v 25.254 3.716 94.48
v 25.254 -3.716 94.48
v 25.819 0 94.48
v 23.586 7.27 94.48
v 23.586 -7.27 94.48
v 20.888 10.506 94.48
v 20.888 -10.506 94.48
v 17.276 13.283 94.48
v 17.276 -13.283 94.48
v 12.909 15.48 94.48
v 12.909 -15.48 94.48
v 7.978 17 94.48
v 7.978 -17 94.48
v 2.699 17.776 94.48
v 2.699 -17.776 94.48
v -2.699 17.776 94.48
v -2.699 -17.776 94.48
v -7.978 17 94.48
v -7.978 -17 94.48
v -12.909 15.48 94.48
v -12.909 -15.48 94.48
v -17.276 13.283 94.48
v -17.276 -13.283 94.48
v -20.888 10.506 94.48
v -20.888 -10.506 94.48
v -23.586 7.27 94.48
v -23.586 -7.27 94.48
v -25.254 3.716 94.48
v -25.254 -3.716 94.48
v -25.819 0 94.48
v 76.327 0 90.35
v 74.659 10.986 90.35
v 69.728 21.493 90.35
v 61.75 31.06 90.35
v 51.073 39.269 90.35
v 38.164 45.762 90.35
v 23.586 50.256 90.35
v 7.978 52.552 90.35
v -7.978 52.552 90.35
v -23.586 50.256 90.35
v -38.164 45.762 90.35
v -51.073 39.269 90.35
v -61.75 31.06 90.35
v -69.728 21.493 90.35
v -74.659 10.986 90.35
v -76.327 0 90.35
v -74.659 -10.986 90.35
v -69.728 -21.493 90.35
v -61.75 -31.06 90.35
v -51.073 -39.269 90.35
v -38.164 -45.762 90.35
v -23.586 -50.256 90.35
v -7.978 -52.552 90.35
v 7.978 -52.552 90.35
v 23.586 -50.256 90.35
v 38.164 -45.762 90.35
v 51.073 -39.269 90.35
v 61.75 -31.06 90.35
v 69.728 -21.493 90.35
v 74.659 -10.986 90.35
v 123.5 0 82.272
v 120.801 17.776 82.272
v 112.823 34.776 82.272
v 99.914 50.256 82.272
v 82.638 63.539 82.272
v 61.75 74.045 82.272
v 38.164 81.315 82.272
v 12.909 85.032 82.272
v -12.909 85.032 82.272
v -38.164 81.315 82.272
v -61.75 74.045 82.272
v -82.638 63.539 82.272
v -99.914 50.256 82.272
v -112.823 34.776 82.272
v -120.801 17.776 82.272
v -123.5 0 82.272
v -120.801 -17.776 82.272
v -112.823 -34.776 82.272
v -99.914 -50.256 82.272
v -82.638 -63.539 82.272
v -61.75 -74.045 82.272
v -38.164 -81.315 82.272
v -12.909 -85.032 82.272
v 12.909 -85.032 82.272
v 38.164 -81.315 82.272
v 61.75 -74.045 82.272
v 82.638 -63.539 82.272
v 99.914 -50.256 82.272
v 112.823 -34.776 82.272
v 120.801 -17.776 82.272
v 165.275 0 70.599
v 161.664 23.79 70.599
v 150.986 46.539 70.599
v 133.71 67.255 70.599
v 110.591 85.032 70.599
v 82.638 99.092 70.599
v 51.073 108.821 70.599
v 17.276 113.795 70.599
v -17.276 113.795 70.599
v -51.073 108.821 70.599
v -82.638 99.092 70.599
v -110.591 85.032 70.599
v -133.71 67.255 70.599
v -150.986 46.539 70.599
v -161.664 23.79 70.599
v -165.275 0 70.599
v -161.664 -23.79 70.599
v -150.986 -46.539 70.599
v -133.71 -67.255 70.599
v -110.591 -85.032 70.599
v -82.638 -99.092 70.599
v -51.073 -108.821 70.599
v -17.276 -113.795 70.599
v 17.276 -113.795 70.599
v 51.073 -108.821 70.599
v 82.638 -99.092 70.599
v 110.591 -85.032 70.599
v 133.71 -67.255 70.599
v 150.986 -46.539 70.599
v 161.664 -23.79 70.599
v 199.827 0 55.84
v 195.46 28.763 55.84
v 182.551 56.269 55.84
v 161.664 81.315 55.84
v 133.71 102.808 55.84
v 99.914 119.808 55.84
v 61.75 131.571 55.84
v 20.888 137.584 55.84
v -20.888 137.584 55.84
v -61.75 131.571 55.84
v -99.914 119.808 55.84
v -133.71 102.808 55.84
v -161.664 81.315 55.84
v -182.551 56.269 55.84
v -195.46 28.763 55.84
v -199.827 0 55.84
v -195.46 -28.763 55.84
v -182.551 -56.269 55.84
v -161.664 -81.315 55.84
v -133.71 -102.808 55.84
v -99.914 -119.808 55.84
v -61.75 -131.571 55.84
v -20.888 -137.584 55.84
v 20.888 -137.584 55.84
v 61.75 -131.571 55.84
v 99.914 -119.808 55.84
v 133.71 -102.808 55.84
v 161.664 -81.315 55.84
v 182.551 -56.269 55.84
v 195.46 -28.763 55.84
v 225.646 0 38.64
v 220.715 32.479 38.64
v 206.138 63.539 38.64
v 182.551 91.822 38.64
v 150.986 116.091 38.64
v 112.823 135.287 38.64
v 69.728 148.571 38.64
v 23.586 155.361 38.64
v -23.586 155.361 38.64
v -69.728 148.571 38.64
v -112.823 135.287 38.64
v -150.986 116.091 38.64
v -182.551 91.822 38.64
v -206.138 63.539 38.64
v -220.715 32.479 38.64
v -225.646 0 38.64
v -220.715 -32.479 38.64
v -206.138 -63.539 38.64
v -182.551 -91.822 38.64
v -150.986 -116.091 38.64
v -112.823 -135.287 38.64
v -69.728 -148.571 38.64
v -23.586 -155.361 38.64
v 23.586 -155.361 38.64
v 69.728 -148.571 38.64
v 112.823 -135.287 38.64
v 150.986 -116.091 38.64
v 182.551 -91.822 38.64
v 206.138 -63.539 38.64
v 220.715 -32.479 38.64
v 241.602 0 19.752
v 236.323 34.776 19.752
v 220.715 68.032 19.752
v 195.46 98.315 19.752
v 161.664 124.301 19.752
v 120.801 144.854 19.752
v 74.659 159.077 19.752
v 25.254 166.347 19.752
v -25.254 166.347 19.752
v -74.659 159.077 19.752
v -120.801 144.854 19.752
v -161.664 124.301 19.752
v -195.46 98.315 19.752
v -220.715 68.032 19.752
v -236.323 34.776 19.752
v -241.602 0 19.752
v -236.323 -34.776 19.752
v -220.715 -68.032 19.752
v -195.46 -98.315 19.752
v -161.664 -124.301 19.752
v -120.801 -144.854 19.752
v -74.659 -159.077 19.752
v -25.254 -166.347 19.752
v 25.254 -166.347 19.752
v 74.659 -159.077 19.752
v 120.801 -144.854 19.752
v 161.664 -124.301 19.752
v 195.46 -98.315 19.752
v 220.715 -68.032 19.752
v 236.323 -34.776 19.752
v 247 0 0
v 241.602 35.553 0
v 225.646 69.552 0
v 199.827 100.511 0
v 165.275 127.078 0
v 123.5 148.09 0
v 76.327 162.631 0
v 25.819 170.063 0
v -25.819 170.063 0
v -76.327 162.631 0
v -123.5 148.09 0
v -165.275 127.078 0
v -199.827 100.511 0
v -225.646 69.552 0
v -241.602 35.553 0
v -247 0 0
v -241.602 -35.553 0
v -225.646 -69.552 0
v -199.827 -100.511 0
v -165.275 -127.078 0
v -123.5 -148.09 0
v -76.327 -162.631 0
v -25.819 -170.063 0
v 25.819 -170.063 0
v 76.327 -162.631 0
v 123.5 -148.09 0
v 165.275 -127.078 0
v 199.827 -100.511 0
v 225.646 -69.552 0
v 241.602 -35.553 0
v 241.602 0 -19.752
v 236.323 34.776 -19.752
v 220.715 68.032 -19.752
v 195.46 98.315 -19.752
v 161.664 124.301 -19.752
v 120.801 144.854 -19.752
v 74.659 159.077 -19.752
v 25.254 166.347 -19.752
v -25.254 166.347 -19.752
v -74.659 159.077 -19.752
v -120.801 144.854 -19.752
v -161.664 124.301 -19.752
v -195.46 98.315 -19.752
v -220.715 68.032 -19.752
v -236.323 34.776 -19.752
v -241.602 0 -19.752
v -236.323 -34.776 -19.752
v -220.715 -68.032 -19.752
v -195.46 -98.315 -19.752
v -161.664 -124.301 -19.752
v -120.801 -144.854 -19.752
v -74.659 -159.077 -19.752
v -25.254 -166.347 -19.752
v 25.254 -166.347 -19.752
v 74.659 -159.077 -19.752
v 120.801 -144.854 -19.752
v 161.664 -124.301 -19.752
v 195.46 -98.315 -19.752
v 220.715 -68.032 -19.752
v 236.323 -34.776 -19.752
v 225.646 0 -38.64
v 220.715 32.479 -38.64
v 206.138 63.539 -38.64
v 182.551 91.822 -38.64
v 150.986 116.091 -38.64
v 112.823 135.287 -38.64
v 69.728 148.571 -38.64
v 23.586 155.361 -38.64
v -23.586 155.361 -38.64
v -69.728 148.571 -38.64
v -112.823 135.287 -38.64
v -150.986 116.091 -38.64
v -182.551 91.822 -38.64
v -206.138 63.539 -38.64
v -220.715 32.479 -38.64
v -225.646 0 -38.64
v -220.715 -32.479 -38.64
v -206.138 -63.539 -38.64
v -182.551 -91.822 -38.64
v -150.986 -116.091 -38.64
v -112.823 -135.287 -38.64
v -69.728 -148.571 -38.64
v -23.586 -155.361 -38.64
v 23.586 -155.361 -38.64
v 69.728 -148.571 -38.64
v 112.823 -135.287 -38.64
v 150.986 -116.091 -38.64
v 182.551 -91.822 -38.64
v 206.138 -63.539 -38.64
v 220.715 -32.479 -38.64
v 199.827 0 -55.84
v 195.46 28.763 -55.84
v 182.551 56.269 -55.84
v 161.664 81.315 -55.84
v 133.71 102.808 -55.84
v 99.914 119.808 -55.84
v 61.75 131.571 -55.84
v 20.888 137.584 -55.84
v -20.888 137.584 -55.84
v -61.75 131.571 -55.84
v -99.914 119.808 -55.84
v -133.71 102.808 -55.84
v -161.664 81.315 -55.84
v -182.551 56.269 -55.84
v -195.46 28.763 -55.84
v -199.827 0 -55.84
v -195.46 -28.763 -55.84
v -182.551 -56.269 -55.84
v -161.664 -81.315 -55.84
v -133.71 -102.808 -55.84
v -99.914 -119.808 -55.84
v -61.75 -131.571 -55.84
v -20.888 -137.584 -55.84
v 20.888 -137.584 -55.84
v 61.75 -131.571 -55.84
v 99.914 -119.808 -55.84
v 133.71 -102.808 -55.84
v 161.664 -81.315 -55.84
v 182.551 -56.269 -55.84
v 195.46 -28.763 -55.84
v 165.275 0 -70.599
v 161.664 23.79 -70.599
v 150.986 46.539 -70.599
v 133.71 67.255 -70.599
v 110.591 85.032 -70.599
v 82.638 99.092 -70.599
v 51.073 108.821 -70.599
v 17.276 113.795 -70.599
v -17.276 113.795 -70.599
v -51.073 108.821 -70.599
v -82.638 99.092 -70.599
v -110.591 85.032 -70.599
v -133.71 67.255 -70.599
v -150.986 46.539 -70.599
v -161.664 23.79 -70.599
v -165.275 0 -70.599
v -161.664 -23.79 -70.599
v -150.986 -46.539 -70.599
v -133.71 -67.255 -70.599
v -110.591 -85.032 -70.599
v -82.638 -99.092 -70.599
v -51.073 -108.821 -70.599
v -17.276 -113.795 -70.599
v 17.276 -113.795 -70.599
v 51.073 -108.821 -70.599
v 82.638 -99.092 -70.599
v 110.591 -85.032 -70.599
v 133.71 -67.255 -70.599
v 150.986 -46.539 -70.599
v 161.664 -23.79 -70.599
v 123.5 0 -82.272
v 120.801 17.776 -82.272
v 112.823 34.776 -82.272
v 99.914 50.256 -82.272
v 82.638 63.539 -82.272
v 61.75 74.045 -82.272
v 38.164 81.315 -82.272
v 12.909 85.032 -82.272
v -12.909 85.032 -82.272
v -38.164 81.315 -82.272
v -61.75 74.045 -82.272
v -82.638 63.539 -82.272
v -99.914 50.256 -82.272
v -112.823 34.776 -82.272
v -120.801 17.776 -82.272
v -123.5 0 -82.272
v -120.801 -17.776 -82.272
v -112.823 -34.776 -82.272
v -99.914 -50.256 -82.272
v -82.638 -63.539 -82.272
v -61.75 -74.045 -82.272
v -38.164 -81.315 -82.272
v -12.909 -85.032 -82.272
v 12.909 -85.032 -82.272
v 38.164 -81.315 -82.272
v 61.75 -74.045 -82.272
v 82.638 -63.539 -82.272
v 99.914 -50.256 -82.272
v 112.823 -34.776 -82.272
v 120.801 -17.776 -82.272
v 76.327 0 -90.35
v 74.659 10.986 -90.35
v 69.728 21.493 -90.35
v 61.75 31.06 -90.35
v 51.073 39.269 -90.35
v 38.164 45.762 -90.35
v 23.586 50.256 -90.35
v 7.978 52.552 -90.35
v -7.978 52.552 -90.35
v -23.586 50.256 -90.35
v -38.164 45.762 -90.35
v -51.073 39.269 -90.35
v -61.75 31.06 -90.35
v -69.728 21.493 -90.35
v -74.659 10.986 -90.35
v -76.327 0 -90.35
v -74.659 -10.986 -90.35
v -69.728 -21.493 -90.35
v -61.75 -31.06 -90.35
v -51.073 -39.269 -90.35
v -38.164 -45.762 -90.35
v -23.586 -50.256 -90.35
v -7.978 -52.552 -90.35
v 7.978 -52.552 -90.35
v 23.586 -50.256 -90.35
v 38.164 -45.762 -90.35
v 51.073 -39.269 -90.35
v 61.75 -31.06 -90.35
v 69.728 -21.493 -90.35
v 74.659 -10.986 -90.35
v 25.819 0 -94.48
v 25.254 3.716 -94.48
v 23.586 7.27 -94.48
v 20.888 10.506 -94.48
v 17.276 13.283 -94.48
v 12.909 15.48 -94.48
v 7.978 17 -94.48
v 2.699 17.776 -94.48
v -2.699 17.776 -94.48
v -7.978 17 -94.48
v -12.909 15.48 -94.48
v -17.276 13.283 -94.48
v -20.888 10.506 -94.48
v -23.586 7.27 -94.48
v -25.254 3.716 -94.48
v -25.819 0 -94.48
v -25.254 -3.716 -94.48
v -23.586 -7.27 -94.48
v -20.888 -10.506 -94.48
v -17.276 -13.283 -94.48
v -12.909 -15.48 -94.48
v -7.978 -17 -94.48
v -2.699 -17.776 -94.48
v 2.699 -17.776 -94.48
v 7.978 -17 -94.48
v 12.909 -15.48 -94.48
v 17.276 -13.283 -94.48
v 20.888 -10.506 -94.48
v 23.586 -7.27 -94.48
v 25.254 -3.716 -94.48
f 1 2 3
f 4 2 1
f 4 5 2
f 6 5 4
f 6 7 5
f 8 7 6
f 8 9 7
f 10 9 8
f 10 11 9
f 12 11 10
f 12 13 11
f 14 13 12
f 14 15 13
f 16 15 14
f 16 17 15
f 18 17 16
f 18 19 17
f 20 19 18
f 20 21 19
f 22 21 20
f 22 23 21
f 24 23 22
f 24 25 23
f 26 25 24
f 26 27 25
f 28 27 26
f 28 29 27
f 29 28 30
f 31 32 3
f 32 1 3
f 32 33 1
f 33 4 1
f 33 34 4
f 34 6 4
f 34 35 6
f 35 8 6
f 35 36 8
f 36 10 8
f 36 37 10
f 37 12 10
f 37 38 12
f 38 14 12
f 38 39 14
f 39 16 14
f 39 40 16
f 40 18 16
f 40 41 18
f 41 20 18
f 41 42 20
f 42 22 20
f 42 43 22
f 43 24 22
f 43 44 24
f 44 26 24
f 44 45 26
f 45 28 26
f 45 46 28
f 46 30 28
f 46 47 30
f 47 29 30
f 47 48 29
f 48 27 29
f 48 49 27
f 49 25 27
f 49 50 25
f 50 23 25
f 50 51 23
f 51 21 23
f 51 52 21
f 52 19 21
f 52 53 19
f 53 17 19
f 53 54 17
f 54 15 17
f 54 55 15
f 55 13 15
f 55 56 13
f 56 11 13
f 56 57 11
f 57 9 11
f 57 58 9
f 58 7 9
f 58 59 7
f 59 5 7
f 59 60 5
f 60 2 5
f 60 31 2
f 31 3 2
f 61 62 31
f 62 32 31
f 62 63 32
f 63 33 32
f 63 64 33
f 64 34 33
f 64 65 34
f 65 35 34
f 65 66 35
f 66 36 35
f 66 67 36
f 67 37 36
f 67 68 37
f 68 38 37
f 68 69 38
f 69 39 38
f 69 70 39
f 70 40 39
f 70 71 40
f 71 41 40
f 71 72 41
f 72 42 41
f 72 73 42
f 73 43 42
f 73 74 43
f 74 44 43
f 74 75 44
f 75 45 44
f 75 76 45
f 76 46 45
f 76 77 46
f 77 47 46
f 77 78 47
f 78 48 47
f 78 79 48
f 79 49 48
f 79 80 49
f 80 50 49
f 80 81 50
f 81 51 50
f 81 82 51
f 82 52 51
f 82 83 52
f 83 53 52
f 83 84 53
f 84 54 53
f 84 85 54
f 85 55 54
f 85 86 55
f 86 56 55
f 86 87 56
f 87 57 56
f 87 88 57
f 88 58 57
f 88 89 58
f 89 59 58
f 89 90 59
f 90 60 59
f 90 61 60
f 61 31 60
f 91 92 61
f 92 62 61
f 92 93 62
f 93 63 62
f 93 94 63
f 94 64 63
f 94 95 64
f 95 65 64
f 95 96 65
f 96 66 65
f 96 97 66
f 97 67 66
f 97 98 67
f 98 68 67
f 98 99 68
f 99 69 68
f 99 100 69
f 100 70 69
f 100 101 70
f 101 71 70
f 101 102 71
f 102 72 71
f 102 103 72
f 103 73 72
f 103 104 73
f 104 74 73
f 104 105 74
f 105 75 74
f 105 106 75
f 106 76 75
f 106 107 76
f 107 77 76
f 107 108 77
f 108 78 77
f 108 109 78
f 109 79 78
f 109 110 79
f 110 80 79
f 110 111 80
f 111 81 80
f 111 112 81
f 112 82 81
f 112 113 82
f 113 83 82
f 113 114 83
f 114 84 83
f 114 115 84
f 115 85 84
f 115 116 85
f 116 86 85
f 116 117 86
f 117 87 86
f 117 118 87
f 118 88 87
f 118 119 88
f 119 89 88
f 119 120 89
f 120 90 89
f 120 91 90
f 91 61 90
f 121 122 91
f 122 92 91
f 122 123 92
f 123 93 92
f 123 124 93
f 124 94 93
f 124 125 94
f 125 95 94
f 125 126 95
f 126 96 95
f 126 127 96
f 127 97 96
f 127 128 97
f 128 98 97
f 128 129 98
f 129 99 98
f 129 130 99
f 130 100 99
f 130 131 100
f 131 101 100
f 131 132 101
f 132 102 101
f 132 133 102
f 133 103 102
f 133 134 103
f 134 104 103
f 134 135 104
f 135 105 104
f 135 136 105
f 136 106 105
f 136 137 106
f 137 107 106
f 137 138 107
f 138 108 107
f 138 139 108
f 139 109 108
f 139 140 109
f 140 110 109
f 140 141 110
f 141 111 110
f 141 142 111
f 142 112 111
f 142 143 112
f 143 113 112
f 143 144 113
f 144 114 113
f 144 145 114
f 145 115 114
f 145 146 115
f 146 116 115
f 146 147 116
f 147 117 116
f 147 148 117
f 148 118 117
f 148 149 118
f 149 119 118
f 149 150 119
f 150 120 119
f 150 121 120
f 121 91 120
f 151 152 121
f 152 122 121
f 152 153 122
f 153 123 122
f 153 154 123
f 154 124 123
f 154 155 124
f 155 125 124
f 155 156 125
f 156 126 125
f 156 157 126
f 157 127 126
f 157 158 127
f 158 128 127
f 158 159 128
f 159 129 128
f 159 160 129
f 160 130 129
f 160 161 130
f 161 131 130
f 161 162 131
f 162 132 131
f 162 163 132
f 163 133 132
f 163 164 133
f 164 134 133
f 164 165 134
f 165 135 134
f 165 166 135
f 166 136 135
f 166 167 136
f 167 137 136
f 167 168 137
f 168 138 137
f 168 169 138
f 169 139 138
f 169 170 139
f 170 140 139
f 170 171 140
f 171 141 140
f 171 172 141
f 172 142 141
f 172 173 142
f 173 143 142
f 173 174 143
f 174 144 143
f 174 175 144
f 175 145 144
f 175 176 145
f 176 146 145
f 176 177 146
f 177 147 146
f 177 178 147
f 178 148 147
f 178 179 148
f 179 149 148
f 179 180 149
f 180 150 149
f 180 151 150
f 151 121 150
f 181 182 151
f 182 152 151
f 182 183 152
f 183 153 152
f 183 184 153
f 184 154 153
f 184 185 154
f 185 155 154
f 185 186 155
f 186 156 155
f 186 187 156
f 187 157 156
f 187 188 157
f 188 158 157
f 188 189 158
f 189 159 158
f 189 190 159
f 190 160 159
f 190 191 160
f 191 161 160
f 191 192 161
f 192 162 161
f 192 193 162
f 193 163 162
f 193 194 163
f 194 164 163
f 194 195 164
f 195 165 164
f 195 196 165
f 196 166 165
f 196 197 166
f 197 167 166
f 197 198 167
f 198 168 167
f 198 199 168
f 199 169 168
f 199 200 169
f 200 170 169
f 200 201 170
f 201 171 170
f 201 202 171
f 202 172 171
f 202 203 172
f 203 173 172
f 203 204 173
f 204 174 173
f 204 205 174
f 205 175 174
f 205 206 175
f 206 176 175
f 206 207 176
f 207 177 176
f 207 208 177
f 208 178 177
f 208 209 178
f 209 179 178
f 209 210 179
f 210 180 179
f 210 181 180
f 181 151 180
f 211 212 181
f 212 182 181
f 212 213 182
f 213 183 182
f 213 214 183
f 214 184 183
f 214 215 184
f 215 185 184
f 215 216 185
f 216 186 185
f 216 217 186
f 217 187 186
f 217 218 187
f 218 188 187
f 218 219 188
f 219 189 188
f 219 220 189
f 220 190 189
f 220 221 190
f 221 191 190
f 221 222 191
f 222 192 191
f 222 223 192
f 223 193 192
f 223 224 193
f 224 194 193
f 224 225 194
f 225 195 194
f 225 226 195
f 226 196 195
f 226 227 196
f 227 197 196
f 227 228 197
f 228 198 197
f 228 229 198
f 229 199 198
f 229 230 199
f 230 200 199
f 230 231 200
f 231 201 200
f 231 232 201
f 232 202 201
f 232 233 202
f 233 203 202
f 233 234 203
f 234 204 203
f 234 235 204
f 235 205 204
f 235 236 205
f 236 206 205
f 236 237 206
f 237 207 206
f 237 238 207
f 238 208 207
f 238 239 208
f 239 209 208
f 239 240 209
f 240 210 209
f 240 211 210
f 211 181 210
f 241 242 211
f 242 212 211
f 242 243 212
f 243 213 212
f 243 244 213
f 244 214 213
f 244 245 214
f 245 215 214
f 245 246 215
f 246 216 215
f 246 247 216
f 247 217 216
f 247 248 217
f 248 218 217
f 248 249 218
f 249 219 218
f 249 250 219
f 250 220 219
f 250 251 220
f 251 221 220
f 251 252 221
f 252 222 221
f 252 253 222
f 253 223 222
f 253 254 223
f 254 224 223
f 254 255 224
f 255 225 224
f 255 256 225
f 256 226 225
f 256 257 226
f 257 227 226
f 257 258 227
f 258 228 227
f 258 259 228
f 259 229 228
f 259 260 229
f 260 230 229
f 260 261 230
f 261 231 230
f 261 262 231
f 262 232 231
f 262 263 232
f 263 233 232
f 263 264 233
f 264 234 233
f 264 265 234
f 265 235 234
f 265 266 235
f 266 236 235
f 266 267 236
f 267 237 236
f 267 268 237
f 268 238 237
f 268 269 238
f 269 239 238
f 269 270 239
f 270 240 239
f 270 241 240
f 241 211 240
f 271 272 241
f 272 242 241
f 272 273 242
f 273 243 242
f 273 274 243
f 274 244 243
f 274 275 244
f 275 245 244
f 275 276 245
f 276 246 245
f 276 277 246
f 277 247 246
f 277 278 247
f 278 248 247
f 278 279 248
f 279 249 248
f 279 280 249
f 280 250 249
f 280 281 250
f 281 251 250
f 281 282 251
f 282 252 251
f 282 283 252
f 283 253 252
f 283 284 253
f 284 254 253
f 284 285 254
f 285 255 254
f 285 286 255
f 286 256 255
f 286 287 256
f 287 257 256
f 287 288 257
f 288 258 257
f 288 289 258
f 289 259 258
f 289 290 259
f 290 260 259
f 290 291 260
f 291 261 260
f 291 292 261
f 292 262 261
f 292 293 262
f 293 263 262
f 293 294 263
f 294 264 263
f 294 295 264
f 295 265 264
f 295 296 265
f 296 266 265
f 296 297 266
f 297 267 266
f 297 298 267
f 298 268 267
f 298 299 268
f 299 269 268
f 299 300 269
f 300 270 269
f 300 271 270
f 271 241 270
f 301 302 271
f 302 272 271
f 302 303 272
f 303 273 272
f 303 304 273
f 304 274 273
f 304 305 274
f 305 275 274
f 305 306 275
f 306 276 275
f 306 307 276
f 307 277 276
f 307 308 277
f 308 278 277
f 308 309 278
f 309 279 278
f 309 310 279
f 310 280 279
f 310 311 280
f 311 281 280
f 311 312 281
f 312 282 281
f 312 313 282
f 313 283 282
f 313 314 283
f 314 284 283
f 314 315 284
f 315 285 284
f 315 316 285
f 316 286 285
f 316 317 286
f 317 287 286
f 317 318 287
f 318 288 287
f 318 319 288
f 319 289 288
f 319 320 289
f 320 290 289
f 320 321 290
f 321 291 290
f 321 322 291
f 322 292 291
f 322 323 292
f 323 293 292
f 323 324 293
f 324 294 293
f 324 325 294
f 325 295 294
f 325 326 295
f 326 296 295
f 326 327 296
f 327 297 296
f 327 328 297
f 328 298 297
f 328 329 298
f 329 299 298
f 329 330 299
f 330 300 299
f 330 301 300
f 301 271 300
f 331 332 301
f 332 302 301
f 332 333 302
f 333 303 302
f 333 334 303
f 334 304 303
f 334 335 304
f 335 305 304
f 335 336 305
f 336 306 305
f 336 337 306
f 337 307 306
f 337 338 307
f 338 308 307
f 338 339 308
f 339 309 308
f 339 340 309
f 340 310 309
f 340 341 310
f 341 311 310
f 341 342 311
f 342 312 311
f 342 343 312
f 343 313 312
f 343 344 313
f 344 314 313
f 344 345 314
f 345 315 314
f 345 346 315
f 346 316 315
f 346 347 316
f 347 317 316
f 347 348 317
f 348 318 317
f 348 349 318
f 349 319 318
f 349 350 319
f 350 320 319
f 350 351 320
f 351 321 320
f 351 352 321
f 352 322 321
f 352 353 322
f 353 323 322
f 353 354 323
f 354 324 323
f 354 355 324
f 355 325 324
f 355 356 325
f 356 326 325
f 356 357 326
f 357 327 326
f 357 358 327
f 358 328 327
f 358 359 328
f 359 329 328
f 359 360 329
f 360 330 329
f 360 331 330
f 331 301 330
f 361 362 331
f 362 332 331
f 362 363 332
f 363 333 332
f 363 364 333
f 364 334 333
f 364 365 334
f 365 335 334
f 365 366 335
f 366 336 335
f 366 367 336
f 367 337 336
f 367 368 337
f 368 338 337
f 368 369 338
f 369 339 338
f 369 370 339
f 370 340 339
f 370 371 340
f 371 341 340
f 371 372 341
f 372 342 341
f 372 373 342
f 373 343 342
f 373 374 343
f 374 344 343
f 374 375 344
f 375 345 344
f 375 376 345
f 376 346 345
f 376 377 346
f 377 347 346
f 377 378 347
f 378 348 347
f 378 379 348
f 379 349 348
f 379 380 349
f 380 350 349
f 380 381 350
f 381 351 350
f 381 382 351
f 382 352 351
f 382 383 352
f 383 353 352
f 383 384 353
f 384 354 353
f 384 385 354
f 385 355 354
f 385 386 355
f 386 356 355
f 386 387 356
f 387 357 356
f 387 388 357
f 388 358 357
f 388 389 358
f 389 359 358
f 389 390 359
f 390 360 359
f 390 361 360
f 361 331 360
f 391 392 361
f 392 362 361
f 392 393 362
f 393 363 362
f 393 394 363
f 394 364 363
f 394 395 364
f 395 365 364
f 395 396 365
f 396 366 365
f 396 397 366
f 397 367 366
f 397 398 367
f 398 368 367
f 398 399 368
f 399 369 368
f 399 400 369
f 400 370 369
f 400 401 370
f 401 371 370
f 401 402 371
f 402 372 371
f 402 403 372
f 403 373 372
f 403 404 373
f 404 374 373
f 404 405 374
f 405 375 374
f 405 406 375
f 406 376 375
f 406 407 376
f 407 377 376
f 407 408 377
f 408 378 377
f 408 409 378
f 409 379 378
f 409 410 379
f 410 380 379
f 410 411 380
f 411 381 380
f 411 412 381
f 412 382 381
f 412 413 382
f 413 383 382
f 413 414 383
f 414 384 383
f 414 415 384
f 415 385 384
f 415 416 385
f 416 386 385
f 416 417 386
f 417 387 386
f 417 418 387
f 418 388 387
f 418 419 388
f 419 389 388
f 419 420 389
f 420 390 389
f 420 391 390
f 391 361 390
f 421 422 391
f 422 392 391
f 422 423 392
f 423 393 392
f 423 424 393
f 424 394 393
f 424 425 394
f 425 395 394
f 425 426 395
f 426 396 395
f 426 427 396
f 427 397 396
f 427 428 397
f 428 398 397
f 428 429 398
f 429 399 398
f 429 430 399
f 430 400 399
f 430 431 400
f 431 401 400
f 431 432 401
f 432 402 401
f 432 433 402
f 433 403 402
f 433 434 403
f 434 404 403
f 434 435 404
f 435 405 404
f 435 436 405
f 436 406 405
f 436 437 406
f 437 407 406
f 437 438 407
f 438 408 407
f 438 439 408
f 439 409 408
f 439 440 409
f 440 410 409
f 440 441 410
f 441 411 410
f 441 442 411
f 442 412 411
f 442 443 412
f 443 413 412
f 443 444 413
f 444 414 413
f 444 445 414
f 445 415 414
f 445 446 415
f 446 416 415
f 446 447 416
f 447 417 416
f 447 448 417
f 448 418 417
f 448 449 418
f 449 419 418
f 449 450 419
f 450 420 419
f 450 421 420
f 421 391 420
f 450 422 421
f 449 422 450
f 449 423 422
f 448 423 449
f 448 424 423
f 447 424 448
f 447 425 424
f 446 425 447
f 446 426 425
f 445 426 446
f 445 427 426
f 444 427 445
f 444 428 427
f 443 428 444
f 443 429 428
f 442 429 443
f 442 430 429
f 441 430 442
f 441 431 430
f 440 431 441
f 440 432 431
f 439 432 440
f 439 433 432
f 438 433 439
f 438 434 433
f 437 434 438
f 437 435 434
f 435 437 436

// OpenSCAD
// Generated by SolidPython 1.0.1 on 2020-07-29 00:46:50


scale(v = [13, 9, 5]) {
	sphere(r = 19);
}
/***********************************************
*********      SolidPython code:      **********
************************************************
 
# import packages: SolidPython
from solid import *
from solid.utils import *
from itertools import chain, combinations, permutations


class Resize:

    def __init__(self, scad_file):
        self.scad_file = scad_file
        #self.scad_file = import_scad(scad_file)
        # cone/cylinder param:
        self.r1 = 0
        self.r2 = 0
        self.h = 0
        # rectangular prism param:
        self.w = 0
        self.l = 0
        # ellipse param:
        self.r = 0

    # import OpenScad code (file name corresponds to shape)


    # classify shape + parameters
    def assign(self, param1, param2, param3):
        if self.scad_file == 'cone.scad':
            self.r1 = param1
            self.r2 = param2
            self.h = param3
        elif self.scad_file == 'cylinder.scad':
            self.r1 = param1
            self.r2 = param2
            self.h = param3
        elif self.scad_file == 'rectangularPrism.scad':
            self.h = param1
            self.l = param2
            self.w = param3
        else:
            self.r = param1
            self.h = param2

    # resize parameters
    def iterate(self):
        x = range(3, 20, 2)
        i = 1
        if self.scad_file == 'cone.scad':
            tempList = list(permutations(x, 2))
            for temp in tempList:
                param1 = temp[0]
                param2 = temp[1]
                filepath = 'produced_scad_files/' + 'cone' + str(param1) + '_' + str(param2) + '_' + '.scad'
                scad_render_to_file(cylinder(h=param1, r1=param2, r2=0), filepath)

        elif self.scad_file == 'cylinder.scad':
            tempList = list(permutations(x, 3))
            for temp in tempList:
                param1 = temp[0]
                param2 = temp[1]
                filepath = 'produced_scad_files/' + 'cylinder' + str(param1) + '_' + str(param2) + '_' + '.scad'
                scad_render_to_file(cylinder(h=param1, r1=param2, r2=param2), filepath)

        elif self.scad_file == 'rectangularPrism.scad':
            tempList = list(permutations(x, 3))
            for temp in tempList:
                param1 = temp[0]
                param2 = temp[1]
                param3 = temp[2]
                filepath = 'produced_scad_files/' + 'rectangularPrism' + str(param1) + '_' + str(param2) + '_' + str(
                    param3) + '.scad'
                scad_render_to_file(cube(size=(param1, param2, param3)), filepath)

        elif self.scad_file == 'ellipse.scad':
            tempList = list(permutations(x, 4))
            for temp in tempList:
                param1 = temp[0]
                param2 = temp[1]
                param3 = temp[2]
                param4 = temp[3]
                filepath = 'produced_scad_files/' + 'ellipse' + str(param1) + '_' + str(param2) + '_' + str(param3) + '_' + str(param4) + '.scad'
                scad_render_to_file(scale([param1, param2, param3])(sphere(r=param4)), filepath)

    def render_to_scadfile(self):
        scad_render_to_file(scad, 'example.scad') 
 
************************************************/
